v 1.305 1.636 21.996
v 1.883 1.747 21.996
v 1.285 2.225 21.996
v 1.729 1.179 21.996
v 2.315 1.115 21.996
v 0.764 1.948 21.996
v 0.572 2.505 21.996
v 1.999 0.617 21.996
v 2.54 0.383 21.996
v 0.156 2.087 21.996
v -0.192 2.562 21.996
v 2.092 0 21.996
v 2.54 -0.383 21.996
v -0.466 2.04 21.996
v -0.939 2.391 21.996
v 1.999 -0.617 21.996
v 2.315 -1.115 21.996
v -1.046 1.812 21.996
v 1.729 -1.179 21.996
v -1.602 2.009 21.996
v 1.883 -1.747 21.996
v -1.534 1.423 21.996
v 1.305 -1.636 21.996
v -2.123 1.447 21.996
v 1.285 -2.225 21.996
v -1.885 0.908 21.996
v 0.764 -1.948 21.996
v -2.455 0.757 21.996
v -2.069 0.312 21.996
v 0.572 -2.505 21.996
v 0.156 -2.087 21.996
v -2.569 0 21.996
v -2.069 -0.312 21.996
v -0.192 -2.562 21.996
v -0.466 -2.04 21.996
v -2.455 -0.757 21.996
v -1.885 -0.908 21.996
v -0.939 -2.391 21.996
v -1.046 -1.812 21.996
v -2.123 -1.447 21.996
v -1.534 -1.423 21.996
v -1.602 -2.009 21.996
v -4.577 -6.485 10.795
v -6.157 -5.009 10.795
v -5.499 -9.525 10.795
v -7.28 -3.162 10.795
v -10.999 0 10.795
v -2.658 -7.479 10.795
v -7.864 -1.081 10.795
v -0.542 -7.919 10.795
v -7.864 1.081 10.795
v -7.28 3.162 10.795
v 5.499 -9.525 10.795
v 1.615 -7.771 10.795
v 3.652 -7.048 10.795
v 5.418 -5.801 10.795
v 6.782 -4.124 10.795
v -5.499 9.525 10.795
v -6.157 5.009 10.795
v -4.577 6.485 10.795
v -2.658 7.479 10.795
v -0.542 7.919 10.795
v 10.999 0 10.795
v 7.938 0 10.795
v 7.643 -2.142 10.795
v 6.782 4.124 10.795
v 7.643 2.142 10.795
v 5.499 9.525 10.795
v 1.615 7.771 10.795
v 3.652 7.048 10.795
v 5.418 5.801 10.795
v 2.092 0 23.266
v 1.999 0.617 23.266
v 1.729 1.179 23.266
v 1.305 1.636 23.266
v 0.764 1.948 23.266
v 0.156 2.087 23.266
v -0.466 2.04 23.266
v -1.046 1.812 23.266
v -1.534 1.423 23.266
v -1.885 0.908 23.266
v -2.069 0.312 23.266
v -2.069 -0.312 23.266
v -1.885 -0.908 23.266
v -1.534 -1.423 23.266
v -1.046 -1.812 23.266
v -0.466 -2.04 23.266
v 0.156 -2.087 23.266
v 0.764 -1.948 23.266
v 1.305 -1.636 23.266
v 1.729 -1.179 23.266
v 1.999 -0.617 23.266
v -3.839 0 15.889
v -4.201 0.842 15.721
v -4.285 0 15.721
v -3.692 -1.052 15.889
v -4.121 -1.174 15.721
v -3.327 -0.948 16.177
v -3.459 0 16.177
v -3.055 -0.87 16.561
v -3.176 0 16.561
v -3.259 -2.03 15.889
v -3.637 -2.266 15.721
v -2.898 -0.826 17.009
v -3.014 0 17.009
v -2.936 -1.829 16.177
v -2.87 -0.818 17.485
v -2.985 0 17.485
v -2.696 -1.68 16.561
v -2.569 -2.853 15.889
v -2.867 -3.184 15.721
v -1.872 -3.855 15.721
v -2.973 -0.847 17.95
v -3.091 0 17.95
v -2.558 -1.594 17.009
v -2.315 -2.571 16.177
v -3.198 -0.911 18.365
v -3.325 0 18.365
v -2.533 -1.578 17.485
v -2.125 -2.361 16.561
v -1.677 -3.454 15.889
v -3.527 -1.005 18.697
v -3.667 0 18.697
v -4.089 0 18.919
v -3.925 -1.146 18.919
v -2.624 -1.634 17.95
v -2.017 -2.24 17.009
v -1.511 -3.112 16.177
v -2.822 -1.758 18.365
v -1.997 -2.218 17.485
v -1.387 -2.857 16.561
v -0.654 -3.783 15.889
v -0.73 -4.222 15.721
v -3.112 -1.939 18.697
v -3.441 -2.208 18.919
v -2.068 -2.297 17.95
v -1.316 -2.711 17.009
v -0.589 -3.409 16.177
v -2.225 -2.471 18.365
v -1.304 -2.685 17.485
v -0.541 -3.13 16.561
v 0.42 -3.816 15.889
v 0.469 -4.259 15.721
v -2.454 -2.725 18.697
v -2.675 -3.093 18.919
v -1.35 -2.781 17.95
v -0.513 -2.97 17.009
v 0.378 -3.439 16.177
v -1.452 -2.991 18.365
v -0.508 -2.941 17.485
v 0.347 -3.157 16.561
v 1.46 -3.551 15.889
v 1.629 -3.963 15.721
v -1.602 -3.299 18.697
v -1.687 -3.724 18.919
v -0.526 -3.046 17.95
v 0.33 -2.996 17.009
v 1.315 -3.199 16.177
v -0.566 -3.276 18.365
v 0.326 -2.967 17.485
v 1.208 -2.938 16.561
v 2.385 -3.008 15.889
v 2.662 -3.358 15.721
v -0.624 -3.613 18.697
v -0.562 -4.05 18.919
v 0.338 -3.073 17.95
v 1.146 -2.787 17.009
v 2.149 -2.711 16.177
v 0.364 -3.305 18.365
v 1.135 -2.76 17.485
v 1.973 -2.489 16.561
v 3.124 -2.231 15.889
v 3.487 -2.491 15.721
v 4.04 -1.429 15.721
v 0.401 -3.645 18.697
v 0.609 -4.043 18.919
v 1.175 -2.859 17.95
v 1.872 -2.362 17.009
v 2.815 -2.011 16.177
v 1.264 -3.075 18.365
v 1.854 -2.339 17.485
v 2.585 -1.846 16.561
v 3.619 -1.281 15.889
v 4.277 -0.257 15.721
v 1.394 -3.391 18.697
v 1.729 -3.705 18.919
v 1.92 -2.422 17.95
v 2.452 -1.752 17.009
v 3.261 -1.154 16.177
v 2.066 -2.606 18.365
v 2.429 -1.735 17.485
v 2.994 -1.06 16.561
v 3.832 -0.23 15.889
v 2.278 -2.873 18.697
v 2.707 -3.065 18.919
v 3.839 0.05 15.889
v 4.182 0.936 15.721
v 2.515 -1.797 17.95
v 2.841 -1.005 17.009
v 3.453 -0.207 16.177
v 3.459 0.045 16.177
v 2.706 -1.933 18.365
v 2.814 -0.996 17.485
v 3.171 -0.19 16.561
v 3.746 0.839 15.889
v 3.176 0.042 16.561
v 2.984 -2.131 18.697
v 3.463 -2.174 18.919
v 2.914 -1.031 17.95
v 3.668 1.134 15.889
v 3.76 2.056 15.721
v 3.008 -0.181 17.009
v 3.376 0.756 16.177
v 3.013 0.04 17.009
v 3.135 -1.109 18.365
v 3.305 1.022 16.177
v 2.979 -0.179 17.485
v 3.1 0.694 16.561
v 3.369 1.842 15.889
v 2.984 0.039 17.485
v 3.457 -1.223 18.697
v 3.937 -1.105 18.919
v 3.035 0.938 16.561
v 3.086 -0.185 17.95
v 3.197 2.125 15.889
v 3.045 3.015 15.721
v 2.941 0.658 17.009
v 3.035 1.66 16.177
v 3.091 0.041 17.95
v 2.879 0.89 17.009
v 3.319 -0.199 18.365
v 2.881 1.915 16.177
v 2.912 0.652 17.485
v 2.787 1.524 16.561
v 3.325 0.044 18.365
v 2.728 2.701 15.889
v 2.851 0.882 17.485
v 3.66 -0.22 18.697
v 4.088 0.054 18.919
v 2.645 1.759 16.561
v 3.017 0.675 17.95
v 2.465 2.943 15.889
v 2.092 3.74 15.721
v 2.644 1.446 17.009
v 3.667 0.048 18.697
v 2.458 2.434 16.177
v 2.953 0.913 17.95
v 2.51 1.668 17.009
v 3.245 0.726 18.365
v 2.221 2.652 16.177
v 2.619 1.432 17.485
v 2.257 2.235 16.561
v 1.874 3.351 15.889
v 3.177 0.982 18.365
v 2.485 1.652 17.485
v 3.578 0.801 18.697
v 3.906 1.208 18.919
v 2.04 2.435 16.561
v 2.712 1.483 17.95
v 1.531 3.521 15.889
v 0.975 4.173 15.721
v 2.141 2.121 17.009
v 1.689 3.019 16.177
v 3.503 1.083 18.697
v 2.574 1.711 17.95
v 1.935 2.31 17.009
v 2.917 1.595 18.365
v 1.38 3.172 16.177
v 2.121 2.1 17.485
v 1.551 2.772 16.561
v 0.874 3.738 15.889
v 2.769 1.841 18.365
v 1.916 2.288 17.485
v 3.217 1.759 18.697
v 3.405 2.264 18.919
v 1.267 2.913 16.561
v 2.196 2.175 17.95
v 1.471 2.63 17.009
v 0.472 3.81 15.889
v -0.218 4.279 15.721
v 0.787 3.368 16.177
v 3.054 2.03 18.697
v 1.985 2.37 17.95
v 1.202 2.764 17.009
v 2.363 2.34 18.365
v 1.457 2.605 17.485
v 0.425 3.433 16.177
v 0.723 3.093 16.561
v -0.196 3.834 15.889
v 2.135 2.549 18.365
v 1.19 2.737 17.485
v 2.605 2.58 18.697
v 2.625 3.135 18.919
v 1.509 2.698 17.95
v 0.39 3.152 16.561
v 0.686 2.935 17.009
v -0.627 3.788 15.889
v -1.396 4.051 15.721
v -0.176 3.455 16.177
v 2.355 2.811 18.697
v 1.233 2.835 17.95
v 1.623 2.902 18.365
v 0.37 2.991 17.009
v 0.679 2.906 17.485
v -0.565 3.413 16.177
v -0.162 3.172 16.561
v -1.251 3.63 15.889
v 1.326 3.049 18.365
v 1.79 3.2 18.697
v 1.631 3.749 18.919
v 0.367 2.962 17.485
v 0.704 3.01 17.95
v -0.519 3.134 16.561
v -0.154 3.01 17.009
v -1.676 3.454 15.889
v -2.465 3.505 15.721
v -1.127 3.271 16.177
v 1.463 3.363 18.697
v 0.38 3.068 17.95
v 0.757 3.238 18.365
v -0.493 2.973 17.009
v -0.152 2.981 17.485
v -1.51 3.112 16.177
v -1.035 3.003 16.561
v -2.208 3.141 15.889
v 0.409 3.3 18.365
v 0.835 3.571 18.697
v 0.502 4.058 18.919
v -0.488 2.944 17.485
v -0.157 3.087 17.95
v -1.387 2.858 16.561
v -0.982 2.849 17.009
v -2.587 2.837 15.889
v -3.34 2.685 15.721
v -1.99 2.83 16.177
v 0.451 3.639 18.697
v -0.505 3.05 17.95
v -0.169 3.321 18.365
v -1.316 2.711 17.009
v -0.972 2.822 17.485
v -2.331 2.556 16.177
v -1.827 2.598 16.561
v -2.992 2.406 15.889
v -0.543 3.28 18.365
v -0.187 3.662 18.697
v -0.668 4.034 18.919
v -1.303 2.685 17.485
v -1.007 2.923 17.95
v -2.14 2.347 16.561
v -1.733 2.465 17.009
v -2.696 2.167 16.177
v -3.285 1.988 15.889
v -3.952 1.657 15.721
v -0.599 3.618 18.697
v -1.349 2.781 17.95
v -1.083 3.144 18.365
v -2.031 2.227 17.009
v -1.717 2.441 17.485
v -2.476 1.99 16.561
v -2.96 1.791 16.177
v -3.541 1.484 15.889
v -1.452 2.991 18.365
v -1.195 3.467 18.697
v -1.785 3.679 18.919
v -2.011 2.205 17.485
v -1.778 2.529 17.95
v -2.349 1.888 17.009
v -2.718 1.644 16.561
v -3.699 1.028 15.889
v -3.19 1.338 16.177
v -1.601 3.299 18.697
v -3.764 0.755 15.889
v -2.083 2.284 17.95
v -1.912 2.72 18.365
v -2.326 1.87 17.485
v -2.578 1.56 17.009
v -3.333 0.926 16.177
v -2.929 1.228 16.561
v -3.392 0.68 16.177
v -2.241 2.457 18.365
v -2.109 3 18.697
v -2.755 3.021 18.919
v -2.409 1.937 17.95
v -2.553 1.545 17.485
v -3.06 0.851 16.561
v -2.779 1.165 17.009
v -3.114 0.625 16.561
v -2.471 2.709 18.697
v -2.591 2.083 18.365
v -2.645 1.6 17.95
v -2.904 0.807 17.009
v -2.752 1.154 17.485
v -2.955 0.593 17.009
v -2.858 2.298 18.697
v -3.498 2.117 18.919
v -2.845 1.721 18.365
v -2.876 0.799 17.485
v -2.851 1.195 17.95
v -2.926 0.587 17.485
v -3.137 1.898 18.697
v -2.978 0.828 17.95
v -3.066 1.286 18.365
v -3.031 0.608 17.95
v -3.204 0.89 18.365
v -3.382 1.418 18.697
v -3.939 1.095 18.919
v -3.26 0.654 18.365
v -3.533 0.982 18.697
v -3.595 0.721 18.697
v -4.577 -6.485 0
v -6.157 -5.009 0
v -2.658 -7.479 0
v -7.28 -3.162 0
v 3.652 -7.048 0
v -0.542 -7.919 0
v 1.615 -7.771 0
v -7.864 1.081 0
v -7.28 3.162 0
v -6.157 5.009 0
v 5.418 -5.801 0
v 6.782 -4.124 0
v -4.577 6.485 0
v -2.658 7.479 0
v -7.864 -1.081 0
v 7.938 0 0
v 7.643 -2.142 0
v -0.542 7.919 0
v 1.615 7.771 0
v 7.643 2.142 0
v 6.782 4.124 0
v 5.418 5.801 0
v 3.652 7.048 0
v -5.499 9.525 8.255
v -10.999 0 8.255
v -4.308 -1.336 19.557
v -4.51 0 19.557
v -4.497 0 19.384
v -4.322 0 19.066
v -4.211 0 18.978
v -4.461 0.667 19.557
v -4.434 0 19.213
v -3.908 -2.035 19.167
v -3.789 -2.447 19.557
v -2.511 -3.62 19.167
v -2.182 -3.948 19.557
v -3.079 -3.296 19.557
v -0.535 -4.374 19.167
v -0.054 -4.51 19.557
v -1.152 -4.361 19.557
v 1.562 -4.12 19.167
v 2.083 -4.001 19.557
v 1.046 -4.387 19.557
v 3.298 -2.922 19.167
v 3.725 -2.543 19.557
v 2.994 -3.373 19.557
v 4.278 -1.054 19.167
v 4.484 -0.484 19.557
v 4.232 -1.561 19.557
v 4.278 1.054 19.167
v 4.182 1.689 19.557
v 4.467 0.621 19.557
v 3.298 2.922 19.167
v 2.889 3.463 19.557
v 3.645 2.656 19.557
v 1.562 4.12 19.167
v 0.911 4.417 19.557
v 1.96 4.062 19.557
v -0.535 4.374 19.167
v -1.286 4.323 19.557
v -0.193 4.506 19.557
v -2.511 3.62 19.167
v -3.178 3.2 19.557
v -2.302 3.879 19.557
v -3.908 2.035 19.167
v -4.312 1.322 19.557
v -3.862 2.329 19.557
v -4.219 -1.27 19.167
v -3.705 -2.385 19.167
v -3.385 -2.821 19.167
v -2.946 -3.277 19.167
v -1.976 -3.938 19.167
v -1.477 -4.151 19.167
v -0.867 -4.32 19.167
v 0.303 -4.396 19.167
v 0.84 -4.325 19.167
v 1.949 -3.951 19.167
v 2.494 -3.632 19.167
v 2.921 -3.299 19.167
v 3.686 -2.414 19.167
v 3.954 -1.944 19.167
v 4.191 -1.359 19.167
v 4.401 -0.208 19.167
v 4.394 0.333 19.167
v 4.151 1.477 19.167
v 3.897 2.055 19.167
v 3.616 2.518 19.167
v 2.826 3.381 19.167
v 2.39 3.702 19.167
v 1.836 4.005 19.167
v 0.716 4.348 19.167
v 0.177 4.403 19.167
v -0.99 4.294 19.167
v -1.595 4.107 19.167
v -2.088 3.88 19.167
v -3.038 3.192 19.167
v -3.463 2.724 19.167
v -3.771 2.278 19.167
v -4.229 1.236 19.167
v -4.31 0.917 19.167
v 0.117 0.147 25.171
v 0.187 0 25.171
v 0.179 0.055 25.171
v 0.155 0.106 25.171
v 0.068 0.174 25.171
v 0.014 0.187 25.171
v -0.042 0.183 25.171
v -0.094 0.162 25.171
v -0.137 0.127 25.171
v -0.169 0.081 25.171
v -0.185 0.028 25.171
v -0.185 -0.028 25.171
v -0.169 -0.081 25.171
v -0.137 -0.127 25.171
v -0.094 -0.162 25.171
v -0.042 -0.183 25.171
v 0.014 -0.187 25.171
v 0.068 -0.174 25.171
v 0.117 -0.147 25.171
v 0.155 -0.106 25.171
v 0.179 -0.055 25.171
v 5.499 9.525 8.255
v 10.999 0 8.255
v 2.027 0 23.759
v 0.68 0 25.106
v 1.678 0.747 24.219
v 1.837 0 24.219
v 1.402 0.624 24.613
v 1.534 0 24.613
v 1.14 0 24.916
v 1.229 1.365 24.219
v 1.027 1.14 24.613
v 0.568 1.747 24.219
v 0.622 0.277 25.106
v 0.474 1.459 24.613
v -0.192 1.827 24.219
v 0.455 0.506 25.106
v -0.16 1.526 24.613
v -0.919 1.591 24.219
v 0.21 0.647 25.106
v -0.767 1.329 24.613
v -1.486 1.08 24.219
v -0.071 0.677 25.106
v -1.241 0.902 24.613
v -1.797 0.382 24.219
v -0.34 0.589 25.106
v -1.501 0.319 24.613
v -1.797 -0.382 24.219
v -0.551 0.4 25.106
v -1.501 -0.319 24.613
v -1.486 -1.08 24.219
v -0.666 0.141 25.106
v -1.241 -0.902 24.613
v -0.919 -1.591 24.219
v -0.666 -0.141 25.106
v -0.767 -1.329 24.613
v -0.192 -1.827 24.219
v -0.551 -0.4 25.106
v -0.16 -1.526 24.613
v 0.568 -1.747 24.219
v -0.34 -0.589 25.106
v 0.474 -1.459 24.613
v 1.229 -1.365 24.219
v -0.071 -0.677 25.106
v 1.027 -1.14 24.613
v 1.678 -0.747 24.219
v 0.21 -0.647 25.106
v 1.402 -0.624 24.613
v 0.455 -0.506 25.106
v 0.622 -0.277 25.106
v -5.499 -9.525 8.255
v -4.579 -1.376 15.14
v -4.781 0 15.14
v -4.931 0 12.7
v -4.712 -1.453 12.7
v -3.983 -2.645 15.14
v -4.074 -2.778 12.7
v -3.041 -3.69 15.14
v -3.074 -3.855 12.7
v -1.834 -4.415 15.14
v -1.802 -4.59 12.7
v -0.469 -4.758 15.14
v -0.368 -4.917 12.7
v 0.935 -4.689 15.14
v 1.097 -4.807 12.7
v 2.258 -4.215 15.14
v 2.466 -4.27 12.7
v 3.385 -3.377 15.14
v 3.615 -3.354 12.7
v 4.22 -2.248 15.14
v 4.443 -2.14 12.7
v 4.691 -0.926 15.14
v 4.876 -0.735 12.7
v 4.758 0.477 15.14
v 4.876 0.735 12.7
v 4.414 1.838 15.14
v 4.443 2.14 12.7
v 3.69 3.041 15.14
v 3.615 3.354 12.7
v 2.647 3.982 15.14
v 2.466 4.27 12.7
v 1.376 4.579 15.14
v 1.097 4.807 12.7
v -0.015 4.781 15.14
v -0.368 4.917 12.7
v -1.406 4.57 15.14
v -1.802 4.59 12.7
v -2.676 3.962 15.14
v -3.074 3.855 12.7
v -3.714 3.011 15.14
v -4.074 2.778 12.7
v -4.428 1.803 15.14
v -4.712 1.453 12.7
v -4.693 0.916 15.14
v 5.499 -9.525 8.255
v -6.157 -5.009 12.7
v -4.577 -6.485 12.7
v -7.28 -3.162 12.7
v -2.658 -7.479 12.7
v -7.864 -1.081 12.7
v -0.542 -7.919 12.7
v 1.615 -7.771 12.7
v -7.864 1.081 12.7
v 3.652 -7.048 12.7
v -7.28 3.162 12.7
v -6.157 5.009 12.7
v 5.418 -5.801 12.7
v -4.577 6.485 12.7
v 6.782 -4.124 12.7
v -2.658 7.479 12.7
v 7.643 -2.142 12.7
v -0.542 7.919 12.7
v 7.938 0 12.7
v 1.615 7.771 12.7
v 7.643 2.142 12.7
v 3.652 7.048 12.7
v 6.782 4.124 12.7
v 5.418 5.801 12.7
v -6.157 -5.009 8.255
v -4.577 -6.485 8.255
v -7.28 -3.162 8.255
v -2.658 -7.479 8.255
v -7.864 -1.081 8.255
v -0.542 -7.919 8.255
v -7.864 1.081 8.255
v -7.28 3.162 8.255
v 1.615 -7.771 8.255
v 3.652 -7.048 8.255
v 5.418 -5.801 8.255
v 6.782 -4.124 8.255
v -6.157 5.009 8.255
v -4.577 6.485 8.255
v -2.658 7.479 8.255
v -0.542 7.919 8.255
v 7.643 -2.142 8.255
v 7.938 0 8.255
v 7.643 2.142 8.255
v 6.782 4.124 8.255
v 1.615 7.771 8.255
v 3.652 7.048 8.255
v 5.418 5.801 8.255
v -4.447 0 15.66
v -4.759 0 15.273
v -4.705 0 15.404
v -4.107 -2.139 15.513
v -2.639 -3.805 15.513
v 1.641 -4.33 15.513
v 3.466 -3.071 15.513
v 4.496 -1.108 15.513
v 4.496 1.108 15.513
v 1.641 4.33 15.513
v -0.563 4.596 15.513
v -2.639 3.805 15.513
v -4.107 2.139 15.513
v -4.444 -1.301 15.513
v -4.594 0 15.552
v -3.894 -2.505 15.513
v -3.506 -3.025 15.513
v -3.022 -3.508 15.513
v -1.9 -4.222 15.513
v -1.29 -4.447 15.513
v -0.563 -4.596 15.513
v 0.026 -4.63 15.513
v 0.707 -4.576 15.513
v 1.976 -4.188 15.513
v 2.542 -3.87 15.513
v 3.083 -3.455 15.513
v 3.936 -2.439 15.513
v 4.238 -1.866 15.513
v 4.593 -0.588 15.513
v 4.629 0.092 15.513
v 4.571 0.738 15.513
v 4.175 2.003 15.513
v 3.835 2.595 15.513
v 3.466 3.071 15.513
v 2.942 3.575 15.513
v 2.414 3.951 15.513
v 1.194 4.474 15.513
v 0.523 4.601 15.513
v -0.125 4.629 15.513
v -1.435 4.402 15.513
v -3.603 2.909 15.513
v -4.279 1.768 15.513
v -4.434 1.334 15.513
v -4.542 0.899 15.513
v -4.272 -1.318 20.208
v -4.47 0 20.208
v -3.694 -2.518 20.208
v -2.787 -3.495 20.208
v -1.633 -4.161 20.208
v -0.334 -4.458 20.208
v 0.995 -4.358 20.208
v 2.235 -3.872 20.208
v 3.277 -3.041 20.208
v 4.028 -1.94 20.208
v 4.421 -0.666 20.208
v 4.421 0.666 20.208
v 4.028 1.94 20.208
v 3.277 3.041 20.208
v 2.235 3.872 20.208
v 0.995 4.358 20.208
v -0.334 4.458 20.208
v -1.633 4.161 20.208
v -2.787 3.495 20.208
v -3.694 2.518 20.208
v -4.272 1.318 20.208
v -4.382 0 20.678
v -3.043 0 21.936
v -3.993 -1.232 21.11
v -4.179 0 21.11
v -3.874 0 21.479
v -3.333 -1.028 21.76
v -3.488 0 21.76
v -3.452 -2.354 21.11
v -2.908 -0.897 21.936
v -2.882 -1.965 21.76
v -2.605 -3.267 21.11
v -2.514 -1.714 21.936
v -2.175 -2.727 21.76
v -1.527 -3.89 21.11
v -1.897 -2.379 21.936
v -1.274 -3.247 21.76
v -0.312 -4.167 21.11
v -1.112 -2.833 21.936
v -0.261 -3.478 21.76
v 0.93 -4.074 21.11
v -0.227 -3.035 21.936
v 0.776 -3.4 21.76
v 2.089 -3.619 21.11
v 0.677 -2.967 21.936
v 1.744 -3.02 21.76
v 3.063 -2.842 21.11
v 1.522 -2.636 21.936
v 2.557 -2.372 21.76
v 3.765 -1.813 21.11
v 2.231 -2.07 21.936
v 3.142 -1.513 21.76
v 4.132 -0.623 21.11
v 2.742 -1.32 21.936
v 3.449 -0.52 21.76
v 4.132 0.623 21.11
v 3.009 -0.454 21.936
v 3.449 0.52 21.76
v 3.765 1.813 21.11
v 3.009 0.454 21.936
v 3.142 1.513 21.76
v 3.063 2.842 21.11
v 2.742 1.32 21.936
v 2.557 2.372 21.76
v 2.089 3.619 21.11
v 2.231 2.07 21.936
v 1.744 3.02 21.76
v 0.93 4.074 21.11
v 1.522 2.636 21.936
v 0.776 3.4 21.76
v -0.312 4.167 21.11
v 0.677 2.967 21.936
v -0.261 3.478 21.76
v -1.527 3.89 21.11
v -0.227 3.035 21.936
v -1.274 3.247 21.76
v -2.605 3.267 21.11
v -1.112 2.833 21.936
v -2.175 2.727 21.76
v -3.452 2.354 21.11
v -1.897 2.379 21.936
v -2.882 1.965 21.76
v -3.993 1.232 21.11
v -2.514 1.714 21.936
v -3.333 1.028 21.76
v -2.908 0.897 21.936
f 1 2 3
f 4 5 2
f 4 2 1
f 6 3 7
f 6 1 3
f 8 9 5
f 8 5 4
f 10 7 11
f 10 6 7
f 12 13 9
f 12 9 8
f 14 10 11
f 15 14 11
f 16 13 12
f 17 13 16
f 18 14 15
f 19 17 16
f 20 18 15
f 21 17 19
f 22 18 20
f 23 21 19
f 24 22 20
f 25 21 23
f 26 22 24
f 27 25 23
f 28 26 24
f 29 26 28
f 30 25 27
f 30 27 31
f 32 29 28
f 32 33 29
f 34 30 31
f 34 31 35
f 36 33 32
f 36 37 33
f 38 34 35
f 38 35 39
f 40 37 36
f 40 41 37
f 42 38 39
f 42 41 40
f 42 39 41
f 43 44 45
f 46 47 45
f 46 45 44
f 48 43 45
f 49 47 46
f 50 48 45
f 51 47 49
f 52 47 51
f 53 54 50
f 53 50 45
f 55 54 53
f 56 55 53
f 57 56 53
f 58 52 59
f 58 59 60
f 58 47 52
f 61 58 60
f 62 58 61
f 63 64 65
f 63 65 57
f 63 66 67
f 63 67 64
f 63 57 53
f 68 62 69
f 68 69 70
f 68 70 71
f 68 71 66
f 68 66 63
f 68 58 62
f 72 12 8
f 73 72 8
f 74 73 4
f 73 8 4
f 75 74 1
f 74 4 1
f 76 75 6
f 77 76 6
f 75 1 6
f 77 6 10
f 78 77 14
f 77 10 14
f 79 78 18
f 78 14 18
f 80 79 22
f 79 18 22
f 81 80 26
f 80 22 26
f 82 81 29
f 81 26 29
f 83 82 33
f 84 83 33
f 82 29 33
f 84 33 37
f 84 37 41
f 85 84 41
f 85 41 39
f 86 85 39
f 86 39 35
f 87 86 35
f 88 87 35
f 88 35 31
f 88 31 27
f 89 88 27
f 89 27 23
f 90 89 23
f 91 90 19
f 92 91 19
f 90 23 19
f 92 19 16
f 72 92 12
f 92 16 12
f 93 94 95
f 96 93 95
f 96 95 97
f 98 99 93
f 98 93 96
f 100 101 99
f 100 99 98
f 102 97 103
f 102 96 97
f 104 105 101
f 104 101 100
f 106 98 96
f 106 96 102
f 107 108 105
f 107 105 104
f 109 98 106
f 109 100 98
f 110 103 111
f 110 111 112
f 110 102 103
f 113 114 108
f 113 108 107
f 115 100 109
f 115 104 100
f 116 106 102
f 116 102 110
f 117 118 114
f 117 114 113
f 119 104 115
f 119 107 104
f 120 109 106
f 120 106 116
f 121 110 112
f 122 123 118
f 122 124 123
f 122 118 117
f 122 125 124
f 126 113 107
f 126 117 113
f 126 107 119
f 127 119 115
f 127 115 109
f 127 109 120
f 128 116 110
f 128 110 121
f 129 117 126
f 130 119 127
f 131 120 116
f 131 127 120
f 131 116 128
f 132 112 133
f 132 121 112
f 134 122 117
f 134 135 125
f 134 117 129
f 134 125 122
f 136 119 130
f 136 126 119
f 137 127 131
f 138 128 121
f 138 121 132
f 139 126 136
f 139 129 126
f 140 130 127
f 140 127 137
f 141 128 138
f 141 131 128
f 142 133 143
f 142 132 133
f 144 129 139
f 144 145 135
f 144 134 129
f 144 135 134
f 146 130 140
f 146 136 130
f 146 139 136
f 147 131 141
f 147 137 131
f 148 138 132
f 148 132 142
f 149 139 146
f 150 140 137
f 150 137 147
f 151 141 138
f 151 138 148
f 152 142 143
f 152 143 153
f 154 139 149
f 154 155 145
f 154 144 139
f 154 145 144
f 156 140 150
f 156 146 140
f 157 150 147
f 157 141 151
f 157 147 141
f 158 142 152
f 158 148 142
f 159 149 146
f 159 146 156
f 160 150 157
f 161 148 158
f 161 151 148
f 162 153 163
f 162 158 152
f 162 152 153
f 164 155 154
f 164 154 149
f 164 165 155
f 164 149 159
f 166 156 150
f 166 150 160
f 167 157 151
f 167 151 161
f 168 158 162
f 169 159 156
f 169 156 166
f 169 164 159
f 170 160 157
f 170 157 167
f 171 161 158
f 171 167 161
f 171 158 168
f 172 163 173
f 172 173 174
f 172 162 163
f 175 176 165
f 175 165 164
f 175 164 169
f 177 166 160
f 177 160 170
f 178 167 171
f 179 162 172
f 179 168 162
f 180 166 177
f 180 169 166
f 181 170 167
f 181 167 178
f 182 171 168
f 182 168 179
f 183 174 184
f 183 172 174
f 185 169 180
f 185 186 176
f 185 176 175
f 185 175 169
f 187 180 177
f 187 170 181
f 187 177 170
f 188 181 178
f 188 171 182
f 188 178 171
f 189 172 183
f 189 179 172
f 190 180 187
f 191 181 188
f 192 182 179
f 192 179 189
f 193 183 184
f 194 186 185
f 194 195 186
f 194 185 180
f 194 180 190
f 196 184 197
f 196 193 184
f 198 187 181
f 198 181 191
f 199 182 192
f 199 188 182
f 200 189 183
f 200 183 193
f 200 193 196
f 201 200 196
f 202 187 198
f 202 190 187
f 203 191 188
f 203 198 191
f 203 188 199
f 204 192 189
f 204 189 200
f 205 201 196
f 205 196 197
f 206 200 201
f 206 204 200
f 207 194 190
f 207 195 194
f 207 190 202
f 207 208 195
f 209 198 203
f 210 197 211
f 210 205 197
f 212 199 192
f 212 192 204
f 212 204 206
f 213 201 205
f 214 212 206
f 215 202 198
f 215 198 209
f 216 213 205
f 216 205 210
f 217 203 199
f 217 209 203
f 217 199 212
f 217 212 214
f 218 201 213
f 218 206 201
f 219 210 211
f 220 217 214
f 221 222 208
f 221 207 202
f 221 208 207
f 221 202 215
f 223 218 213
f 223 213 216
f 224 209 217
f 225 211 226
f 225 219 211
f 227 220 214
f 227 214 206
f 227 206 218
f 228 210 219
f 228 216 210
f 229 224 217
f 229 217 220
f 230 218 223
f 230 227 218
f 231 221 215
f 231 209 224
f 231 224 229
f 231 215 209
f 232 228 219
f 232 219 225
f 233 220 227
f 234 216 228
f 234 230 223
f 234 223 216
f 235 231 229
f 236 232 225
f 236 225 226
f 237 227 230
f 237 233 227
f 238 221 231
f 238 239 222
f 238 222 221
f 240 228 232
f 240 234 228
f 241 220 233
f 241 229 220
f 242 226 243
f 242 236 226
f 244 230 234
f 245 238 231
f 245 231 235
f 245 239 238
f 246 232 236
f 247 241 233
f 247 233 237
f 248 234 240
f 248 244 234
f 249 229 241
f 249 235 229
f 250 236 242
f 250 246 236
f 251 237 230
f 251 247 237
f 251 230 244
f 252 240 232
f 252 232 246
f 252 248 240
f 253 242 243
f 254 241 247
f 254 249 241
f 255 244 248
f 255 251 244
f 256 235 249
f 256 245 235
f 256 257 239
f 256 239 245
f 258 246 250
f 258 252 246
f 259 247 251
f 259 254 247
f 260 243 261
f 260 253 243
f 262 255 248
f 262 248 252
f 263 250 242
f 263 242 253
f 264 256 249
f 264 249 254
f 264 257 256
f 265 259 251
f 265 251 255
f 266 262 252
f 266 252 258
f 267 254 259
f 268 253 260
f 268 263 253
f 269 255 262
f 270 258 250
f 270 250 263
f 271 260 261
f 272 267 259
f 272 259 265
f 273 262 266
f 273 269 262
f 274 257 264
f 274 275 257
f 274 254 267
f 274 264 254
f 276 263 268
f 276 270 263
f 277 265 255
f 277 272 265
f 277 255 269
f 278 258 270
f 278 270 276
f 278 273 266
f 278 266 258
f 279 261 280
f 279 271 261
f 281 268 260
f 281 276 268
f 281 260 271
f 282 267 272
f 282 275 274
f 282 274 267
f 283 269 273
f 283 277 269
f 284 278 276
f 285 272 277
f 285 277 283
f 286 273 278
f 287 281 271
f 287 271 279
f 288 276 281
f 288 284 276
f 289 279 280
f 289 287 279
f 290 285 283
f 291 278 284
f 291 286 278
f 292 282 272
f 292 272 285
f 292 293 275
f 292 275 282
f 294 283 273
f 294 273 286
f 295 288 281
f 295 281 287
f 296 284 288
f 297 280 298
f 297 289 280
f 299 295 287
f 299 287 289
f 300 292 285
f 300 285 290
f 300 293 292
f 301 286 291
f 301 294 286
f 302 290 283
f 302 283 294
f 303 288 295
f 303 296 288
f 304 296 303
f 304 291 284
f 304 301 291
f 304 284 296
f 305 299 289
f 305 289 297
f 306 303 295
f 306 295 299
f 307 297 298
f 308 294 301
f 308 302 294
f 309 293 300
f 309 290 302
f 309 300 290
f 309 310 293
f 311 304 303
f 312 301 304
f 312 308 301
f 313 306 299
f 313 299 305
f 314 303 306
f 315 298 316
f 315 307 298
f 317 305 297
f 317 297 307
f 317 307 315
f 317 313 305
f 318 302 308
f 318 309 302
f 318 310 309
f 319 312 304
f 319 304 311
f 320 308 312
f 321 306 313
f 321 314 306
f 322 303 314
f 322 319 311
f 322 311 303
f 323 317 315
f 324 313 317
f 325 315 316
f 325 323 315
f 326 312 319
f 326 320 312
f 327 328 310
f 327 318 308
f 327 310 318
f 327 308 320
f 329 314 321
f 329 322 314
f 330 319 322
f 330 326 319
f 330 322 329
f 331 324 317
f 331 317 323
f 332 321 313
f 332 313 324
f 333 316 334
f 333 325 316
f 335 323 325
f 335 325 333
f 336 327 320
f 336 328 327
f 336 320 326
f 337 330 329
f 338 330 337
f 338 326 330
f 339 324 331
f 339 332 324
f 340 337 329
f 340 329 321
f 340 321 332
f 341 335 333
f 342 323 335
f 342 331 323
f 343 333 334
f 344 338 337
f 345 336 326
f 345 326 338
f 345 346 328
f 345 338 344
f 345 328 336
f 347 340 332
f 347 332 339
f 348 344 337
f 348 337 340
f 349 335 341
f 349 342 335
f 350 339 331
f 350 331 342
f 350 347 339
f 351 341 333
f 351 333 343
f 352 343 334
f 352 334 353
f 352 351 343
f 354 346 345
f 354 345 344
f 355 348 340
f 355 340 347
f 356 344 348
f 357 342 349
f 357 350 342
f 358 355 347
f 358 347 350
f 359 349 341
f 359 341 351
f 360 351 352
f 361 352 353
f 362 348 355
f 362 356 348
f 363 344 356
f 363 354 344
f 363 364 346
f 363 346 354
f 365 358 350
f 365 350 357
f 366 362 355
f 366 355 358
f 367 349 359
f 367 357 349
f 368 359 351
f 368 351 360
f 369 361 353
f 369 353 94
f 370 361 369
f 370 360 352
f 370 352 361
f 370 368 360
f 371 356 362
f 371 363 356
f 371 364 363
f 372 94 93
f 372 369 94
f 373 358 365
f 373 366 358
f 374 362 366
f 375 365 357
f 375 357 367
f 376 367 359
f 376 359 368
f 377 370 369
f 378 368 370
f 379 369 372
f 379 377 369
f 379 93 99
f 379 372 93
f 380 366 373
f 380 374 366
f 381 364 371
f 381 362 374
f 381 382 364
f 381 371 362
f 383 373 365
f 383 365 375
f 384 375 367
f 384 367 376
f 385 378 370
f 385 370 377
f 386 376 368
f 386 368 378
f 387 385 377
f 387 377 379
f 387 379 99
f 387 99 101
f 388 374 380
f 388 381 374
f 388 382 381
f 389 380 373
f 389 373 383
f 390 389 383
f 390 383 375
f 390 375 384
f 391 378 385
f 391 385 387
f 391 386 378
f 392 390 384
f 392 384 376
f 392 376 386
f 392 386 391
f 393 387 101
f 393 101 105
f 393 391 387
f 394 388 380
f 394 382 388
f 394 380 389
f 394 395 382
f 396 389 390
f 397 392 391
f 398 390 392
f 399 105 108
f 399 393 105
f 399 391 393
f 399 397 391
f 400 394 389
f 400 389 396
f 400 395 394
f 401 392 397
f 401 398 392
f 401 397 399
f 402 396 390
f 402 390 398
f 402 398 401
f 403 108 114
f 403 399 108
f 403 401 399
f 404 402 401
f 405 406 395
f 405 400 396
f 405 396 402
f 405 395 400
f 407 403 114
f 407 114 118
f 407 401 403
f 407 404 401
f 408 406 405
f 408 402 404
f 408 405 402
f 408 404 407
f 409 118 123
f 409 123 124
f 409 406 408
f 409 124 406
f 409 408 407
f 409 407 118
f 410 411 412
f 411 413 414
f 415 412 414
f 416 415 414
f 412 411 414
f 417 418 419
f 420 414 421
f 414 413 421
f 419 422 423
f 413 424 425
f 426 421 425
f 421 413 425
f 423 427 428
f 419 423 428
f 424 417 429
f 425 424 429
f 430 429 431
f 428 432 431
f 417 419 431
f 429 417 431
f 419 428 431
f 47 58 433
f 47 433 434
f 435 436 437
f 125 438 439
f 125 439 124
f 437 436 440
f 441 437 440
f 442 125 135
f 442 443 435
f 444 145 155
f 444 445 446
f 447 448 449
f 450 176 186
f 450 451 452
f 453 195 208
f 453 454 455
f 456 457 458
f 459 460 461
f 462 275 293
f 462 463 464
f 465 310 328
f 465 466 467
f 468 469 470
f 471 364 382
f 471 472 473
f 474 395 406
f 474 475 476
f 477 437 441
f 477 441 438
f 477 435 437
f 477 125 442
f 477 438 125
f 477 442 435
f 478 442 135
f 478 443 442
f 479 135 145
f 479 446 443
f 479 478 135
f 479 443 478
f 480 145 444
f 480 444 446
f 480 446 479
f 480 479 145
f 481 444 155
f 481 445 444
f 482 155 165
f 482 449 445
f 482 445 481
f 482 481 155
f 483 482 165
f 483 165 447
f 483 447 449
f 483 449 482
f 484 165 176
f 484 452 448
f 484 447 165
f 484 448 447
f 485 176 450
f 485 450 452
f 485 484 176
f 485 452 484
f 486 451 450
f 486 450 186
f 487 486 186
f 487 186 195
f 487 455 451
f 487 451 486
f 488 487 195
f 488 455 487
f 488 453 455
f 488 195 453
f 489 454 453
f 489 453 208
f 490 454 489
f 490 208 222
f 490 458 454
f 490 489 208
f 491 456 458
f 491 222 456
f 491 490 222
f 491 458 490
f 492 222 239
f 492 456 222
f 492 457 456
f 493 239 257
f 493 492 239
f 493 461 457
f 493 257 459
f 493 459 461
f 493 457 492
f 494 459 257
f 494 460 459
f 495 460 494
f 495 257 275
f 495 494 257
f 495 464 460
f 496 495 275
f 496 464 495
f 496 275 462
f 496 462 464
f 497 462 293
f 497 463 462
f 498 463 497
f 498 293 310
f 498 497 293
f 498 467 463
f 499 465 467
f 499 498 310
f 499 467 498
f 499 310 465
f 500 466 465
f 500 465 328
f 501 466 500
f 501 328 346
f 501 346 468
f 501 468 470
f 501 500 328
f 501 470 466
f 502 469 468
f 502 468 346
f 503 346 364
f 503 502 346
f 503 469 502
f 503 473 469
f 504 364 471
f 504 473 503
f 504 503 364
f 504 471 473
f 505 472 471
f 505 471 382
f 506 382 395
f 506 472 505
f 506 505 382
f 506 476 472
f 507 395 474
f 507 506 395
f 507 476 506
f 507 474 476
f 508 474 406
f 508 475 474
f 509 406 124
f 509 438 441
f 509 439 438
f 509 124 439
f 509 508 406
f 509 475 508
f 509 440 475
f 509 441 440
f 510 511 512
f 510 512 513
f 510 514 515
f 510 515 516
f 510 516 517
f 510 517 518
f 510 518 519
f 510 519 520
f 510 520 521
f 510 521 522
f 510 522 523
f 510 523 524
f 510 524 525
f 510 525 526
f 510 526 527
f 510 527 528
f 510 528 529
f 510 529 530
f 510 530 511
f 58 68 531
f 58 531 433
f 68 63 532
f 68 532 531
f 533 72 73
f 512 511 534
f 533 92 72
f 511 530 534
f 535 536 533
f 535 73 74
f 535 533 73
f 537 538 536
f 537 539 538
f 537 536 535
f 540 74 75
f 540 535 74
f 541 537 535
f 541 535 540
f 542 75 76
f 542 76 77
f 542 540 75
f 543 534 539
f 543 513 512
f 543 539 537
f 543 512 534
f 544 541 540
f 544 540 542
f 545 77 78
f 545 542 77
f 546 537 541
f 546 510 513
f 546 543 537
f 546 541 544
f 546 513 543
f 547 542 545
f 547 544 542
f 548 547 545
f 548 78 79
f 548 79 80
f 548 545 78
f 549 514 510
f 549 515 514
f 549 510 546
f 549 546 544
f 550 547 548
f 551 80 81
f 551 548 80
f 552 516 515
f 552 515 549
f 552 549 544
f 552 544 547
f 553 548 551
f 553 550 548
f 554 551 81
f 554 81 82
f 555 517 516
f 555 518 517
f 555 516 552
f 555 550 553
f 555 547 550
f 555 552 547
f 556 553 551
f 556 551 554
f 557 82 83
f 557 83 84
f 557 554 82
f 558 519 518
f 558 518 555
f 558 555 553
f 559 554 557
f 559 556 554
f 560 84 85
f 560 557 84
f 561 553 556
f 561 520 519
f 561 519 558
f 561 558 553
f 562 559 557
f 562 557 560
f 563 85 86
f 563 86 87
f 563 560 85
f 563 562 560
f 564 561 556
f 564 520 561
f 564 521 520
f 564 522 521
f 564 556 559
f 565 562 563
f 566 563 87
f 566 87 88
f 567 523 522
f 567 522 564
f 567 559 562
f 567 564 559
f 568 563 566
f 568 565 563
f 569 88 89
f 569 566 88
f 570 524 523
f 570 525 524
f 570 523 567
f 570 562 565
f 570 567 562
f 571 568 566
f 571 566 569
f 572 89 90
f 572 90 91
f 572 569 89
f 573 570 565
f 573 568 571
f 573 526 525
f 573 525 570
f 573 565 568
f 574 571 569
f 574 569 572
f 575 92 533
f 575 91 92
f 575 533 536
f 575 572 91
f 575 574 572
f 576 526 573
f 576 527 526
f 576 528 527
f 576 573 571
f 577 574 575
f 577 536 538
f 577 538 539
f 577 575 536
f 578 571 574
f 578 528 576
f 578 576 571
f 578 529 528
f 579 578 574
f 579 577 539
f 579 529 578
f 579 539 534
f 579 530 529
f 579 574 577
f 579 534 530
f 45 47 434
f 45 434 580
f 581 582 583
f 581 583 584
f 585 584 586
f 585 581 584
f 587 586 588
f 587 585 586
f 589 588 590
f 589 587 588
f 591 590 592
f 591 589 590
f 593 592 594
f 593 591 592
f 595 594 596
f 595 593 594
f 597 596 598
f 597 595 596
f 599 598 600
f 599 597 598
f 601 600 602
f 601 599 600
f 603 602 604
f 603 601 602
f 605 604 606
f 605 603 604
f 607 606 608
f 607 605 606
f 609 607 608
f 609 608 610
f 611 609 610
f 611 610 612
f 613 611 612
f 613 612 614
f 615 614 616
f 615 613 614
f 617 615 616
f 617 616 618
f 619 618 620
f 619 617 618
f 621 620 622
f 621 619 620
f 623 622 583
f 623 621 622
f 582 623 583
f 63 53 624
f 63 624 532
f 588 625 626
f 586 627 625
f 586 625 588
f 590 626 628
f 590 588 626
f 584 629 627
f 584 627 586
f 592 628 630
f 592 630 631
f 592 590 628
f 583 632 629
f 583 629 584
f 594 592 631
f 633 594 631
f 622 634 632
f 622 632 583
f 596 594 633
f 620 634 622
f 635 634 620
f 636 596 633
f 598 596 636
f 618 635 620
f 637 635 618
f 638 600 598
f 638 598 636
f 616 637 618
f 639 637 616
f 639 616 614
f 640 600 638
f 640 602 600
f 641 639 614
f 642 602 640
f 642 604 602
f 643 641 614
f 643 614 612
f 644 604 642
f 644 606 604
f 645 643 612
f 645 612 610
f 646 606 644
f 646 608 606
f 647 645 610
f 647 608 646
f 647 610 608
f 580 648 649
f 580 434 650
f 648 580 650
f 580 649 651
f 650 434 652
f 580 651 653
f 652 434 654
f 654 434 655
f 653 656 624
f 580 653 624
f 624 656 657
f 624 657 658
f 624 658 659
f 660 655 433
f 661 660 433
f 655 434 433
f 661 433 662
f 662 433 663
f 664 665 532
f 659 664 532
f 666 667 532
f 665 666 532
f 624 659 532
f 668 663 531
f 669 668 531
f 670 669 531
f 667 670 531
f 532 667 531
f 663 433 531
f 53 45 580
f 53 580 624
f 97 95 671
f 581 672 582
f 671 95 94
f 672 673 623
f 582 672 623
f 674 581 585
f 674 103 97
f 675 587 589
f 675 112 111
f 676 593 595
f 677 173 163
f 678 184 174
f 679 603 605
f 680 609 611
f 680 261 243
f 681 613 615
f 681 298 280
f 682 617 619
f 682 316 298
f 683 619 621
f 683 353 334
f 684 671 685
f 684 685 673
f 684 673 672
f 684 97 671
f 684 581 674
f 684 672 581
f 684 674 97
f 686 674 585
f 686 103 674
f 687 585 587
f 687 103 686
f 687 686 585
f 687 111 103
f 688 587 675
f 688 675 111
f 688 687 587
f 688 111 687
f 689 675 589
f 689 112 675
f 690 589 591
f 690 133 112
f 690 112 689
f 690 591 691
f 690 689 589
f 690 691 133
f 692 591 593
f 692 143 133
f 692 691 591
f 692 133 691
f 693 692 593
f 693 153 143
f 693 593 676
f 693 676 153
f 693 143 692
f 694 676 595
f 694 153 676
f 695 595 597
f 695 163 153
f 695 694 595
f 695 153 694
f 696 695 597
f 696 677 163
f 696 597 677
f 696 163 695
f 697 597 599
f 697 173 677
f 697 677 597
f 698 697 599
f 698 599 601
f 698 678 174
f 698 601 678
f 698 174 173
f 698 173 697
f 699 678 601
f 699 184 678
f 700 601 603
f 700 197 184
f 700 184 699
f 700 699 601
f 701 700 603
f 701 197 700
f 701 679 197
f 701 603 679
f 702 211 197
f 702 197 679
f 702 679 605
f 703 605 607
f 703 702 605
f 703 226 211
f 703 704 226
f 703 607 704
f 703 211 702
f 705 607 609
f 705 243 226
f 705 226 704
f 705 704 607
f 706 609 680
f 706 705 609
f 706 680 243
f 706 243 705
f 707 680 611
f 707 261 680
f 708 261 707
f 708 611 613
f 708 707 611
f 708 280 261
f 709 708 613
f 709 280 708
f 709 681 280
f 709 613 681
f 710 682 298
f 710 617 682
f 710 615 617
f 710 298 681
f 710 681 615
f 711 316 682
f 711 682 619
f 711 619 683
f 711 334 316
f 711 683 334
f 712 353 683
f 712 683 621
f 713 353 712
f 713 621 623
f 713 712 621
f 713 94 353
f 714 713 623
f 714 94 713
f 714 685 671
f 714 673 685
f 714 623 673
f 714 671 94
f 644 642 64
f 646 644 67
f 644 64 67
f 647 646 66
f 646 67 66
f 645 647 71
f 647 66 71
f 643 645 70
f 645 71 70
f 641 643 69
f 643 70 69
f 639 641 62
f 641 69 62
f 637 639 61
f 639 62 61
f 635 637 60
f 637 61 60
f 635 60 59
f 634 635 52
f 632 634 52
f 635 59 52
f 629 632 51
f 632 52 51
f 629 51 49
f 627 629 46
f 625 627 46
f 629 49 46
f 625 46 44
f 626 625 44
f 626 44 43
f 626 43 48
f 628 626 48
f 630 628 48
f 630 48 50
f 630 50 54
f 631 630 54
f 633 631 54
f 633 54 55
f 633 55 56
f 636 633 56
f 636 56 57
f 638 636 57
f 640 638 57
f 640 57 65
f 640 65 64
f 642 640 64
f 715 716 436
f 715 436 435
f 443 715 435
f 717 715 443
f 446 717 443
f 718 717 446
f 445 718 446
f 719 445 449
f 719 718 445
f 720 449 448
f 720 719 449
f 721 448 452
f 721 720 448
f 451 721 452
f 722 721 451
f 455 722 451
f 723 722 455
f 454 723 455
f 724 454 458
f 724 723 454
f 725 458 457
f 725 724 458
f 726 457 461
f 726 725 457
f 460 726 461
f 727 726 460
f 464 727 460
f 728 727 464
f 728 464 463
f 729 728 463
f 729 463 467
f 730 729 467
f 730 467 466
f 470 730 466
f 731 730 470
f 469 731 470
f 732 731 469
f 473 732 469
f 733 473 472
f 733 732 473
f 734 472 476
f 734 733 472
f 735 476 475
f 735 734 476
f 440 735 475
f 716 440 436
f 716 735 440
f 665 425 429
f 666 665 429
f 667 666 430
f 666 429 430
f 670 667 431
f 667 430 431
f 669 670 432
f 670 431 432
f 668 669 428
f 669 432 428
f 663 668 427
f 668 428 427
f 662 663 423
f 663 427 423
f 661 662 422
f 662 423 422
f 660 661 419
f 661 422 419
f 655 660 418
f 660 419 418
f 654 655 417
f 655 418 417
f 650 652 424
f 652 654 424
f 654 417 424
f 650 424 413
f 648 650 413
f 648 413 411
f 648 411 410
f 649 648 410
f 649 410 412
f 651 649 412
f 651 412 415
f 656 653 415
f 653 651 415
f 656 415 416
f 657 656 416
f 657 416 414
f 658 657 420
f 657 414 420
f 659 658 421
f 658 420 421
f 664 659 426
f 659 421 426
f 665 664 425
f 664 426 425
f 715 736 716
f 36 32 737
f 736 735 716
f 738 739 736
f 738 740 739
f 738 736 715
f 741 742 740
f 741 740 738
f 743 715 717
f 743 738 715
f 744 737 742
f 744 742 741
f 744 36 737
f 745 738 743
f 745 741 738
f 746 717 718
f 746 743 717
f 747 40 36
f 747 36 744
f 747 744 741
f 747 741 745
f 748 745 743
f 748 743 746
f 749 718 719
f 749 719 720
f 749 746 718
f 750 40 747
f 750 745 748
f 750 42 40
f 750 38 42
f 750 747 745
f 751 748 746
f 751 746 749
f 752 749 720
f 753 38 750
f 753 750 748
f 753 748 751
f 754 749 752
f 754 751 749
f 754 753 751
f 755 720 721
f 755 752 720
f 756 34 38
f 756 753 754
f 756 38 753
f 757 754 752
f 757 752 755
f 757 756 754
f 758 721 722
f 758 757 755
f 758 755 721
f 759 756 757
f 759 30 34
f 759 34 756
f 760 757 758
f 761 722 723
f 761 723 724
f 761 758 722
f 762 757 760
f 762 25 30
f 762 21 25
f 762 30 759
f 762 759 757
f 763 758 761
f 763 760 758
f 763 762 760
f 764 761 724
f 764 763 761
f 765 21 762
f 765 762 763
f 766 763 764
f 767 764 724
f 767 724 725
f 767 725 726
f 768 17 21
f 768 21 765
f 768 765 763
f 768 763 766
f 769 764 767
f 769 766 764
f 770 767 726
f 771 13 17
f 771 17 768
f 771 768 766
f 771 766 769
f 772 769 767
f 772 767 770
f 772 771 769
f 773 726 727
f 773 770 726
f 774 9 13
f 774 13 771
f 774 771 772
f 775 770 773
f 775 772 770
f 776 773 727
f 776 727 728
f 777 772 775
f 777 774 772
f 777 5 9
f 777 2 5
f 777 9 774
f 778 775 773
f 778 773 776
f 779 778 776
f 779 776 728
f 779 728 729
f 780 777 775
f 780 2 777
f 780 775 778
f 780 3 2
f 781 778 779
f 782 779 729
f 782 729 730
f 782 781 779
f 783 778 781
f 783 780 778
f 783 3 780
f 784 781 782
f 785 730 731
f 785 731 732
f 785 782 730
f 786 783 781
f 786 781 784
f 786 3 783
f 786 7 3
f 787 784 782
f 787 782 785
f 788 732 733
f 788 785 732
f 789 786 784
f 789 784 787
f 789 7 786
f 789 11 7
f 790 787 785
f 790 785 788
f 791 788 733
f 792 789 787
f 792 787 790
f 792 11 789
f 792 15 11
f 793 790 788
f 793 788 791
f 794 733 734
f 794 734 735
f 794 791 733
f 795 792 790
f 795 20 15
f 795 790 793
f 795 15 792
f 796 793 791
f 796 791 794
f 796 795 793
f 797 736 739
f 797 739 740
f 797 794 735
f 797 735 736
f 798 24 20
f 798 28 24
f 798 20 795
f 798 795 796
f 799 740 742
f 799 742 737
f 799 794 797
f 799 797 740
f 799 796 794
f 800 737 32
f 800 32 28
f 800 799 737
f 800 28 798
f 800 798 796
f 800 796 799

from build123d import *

# Parameters (mm, degrees)
SKETCH1_R      = 7.9375
EXTRUDE1_DEPTH = 12.7
EXTRUDE2_DEPTH = 2.54
FILLET1_R      = 1.905
SKETCH5_R      = 2.092407527
EXTRUDE3_DEPTH = 3.175
FILLET2_R      = 1.905
FILLET3_R      = 0.635


with BuildPart() as part:
    # Sketch1 → Extrude1 (new body)
    with BuildSketch(Plane.XY):
        Circle(SKETCH1_R)
    extrude(amount=EXTRUDE1_DEPTH)

    # Sketch2 → Extrude2 (add)
    with BuildSketch(Plane.XY.offset(10.795)):
        Polygon((5.499261314, 9.525), (-5.499261314, 9.525), (-10.998522628, 0), (-5.499261314, -9.525), (5.499261314, -9.525), (10.998522628, 0), align=None)
    extrude(amount=-EXTRUDE2_DEPTH)

    # Sketch4 → Revolve1 (revolve)
    with BuildSketch(Plane(origin=(0, 0, 0), x_dir=(1, 0, 0), z_dir=(0, 1, 0))):
        with BuildLine():
            Line((-4.931059874, -12.7), (-4.747984705, -15.684208349))
            ThreePointArc((-4.747984705, -15.684208349), (-2.982016662, -17.246023592), (-4.543831906, -19.011991635))
            Line((-4.543831906, -19.011991635), (-4.360756736, -21.996199983))
            Line((-4.360756736, -21.996199983), (0, -21.996199983))
            Line((0, -21.996199983), (0, -12.7))
            Line((0, -12.7), (-4.931059874, -12.7))
        make_face()
    revolve(axis=Axis((0, 0, 12.7), (0, 0, 1)))

    # Fillet1
    fillet1_edges = [part.edges().sort_by_distance(p)[0] for p in [
        (4.360756736, 0, 21.996199983),
    ]]
    fillet(fillet1_edges, radius=FILLET1_R)

    # Sketch5 → Extrude3 (add)
    with BuildSketch(Plane.XY.offset(21.996199983)):
        Circle(SKETCH5_R)
    extrude(amount=EXTRUDE3_DEPTH)

    # Fillet2
    fillet2_edges = [part.edges().sort_by_distance(p)[0] for p in [
        (-2.092407527, 0, 25.171199983),
    ]]
    fillet(fillet2_edges, radius=FILLET2_R)

    # Fillet3
    fillet3_edges = [part.edges().sort_by_distance(p)[0] for p in [
        (4.747984705, 0, 15.684208349),
        (4.543831906, 0, 19.011991635),
    ]]
    fillet(fillet3_edges, radius=FILLET3_R)


solid = part.part
